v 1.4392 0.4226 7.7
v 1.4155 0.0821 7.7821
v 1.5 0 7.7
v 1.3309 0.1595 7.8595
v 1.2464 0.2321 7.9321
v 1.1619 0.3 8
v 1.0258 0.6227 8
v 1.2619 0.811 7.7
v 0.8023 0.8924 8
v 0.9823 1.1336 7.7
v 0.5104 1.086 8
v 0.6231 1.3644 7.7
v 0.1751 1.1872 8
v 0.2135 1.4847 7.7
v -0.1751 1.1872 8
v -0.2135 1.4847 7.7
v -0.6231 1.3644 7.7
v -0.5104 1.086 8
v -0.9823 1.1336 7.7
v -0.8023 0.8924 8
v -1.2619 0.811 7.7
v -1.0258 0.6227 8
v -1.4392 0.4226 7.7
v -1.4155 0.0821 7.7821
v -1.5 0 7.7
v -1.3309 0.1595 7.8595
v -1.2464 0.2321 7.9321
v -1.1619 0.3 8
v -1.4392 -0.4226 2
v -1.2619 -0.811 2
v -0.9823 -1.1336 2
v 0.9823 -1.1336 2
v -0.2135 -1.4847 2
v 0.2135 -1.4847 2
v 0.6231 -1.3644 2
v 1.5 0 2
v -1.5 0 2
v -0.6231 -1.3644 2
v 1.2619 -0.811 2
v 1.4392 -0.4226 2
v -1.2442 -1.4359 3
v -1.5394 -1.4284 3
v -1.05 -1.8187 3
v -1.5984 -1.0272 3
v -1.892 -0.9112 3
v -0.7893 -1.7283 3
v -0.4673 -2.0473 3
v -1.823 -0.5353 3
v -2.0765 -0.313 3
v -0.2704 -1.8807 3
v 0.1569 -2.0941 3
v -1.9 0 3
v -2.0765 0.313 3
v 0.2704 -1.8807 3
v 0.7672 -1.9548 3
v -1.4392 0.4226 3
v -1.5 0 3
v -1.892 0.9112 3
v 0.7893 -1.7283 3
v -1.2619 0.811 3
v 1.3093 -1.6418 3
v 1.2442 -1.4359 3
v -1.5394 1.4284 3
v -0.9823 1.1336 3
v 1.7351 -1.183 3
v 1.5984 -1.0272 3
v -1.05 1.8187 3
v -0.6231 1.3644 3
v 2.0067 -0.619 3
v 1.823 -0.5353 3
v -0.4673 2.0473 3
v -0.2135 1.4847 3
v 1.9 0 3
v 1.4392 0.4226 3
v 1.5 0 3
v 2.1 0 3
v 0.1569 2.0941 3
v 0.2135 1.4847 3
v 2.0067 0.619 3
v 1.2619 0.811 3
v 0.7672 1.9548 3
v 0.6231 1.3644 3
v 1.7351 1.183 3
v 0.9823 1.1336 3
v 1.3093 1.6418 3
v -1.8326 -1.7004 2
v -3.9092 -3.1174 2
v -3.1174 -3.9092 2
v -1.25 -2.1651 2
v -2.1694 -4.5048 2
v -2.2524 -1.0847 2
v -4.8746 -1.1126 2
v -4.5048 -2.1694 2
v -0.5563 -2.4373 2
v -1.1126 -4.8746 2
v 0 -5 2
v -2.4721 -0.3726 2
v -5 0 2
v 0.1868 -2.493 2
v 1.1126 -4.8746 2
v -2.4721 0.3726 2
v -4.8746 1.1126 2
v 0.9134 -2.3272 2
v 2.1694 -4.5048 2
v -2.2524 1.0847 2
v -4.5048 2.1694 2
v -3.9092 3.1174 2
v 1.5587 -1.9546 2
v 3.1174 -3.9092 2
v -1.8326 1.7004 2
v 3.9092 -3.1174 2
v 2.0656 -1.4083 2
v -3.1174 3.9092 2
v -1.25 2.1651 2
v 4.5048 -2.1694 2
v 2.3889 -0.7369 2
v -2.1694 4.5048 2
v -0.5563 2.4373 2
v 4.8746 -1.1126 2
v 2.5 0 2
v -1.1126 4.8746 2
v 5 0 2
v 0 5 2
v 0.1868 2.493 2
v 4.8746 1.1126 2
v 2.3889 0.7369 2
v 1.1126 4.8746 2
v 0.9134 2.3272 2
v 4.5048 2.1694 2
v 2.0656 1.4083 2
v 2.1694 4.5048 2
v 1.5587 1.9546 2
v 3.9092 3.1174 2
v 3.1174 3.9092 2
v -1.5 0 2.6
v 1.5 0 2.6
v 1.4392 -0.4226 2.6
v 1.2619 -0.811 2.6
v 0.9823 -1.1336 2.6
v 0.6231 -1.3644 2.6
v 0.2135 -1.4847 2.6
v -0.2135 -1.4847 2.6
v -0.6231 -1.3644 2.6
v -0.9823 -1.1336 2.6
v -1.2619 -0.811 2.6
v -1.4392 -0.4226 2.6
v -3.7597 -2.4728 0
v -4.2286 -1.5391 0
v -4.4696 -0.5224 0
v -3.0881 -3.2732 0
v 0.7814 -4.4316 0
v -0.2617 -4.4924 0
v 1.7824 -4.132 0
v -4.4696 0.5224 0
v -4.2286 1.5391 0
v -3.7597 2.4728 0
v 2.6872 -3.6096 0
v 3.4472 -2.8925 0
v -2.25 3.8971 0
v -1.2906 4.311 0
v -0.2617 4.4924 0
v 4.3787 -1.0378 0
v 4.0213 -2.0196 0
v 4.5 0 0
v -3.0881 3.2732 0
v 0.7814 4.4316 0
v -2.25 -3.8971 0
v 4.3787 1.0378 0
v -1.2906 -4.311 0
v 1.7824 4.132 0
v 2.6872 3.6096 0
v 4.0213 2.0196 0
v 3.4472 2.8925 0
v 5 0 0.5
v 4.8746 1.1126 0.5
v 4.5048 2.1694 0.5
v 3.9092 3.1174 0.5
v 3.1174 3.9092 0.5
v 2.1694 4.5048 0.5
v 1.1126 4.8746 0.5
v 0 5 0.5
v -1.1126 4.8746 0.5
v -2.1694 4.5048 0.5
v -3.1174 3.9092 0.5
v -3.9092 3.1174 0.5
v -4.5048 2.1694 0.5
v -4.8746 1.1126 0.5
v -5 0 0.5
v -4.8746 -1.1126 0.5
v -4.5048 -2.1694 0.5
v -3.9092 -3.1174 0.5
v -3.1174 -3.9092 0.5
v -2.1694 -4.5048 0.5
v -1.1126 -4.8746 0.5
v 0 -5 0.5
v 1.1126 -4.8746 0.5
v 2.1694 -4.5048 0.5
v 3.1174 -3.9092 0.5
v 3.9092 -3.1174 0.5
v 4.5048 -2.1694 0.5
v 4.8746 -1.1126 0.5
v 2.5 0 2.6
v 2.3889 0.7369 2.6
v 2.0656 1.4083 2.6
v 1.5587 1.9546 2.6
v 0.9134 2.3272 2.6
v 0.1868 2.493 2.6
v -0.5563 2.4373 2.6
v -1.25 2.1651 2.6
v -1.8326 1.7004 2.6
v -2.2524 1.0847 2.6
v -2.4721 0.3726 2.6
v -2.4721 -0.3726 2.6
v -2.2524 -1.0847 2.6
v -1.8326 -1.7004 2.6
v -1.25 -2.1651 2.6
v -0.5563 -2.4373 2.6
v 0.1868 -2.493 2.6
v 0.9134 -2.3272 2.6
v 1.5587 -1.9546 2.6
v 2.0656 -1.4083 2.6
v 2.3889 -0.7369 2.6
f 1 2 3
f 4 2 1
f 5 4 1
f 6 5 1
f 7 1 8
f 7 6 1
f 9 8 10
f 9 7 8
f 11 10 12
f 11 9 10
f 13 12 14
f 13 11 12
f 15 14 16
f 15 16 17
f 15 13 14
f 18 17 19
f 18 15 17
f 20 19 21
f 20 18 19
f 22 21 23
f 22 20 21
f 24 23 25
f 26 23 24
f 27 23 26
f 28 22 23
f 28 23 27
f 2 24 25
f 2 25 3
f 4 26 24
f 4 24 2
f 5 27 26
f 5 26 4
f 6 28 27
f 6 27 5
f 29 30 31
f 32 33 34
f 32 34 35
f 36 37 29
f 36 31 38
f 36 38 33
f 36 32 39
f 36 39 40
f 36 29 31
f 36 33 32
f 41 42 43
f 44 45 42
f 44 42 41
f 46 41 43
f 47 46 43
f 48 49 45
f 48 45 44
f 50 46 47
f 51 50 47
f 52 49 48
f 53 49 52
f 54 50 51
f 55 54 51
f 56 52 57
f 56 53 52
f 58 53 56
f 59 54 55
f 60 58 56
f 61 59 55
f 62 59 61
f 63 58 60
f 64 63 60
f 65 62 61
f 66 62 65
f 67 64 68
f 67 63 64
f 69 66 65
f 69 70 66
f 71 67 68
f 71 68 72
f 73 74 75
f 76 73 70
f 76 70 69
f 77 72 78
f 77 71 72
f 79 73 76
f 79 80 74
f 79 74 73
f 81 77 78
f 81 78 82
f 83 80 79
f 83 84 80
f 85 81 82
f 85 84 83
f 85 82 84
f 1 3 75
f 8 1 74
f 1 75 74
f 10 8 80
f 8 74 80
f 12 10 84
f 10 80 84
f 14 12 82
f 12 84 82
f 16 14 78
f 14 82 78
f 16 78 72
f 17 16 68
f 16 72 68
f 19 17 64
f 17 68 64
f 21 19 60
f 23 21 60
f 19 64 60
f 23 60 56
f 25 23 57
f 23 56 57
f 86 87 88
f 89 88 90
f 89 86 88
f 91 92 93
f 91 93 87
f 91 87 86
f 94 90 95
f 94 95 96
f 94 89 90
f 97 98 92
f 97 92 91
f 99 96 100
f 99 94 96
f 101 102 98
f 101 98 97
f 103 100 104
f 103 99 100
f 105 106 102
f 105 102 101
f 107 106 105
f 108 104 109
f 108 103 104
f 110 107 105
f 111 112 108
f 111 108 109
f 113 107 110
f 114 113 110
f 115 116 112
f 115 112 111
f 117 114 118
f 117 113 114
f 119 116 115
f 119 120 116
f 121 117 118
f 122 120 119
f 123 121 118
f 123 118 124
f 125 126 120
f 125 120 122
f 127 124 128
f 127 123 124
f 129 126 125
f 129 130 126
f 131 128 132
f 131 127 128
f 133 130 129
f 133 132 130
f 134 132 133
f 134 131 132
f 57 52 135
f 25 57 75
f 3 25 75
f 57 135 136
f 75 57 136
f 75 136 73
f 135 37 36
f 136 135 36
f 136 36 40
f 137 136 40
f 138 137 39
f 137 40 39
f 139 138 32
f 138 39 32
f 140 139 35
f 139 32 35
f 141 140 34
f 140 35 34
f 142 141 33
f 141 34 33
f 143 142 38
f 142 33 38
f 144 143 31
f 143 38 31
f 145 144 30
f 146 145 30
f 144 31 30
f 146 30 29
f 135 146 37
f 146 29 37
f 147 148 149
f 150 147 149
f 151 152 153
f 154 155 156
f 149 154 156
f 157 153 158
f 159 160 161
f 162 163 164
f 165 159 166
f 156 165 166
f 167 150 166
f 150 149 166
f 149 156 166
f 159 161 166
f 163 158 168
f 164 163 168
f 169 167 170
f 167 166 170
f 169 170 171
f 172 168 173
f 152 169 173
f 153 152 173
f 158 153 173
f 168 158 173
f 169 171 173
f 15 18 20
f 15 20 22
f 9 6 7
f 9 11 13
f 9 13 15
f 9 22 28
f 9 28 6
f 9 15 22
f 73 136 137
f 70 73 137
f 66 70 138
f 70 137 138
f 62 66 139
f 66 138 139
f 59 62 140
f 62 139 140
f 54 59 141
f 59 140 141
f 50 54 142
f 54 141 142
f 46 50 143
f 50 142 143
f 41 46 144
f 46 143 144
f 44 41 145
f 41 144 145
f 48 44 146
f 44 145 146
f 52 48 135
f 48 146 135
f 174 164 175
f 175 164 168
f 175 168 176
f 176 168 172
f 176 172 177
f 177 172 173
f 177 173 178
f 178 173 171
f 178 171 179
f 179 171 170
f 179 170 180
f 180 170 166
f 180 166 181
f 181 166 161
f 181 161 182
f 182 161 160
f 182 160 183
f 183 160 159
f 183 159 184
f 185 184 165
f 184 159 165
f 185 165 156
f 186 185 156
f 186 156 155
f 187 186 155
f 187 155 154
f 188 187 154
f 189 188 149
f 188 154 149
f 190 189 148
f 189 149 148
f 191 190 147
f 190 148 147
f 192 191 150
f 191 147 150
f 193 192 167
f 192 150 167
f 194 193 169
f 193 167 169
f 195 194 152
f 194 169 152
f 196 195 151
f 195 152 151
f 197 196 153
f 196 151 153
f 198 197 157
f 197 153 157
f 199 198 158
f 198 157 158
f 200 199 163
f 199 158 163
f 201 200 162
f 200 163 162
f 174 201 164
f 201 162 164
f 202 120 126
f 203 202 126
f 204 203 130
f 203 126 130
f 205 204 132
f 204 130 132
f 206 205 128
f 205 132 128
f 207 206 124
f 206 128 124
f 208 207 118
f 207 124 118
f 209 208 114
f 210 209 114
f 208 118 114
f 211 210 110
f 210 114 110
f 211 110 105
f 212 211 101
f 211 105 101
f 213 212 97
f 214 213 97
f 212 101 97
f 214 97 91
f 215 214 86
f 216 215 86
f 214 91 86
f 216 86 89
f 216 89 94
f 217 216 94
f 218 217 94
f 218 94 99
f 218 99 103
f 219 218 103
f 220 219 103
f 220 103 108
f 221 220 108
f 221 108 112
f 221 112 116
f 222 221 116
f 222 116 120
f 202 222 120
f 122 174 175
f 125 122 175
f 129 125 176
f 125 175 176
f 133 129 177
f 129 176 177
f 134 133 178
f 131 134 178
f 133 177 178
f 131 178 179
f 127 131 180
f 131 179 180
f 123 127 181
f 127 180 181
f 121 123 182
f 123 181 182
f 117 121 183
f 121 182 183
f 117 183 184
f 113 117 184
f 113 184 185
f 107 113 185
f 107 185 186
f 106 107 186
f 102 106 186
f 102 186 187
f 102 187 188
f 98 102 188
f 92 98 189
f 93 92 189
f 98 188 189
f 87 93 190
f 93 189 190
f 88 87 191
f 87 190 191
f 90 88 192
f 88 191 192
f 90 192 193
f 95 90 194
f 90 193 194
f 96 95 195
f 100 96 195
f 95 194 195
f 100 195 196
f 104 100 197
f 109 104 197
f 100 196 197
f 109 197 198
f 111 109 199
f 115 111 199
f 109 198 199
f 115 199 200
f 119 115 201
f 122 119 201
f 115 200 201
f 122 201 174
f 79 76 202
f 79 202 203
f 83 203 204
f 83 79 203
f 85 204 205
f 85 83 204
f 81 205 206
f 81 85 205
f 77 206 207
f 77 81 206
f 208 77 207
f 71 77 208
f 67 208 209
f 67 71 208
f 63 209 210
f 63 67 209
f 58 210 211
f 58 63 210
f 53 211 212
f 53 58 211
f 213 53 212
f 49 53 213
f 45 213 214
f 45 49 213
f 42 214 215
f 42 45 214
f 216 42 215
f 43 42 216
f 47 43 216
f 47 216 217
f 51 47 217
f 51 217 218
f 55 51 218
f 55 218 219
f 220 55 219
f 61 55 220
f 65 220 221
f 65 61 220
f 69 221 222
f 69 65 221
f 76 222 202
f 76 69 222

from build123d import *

# Parameters (mm, degrees)
F2_DEPTH = 8
F1_R     = 2.5
F4_DEPTH = 3
F1_R_2   = 5
F6_DEPTH = 2
F7_DEPTH = 2
F8_SIZE  = 0.4
F9_SIZE  = 0.3
F10_SIZE = 0.5
F11_SIZE = 0.4


with BuildPart() as f2:
    # F1 (on Top) → F2 (new body)
    with BuildSketch(Plane.XY):
        with BuildLine():
            Line((-1.5, 0), (1.5, 0))
            ThreePointArc((1.5, 0), (0, 1.5), (-1.5, 0))
        make_face()
    extrude(amount=F2_DEPTH)

    # F1 (on Top) → F4 (join)
    with BuildSketch(Plane.XY):
        Circle(F1_R)
        with BuildLine():
            ThreePointArc((-1.5, 0), (0, 1.5), (1.5, 0))
            ThreePointArc((1.5, 0), (0, -1.5), (-1.5, 0))
        make_face(mode=Mode.SUBTRACT)
    extrude(amount=F4_DEPTH)

    # F1 (on Top) → F6 (join)
    with BuildSketch(Plane.XY):
        Circle(F1_R_2)
        Circle(F1_R, mode=Mode.SUBTRACT)
    extrude(amount=F6_DEPTH)

    # F1 (on Top) → F7 (join)
    with BuildSketch(Plane.XY):
        with BuildLine():
            ThreePointArc((-1.5, 0), (0, -1.5), (1.5, 0))
            Line((1.5, 0), (-1.5, 0))
        make_face()
    extrude(amount=F7_DEPTH)

    # F8
    f8_edges = [f2.edges().sort_by_distance(p)[0] for p in [
        (-2.5, 0, 3),
    ]]
    chamfer(f8_edges, length=F8_SIZE)

    # F9
    f9_edges = [f2.edges().sort_by_distance(p)[0] for p in [
        (0, 1.5, 8),
        (0, 0, 8),
    ]]
    chamfer(f9_edges, length=F9_SIZE)

    # F10
    f10_edges = [f2.edges().sort_by_distance(p)[0] for p in [
        (-5, 0, 0),
    ]]
    chamfer(f10_edges, length=F10_SIZE)

    # F11
    f11_edges = [f2.edges().sort_by_distance(p)[0] for p in [
        (0, -1.5, 3),
    ]]
    chamfer(f11_edges, length=F11_SIZE)


solid = f2.part
